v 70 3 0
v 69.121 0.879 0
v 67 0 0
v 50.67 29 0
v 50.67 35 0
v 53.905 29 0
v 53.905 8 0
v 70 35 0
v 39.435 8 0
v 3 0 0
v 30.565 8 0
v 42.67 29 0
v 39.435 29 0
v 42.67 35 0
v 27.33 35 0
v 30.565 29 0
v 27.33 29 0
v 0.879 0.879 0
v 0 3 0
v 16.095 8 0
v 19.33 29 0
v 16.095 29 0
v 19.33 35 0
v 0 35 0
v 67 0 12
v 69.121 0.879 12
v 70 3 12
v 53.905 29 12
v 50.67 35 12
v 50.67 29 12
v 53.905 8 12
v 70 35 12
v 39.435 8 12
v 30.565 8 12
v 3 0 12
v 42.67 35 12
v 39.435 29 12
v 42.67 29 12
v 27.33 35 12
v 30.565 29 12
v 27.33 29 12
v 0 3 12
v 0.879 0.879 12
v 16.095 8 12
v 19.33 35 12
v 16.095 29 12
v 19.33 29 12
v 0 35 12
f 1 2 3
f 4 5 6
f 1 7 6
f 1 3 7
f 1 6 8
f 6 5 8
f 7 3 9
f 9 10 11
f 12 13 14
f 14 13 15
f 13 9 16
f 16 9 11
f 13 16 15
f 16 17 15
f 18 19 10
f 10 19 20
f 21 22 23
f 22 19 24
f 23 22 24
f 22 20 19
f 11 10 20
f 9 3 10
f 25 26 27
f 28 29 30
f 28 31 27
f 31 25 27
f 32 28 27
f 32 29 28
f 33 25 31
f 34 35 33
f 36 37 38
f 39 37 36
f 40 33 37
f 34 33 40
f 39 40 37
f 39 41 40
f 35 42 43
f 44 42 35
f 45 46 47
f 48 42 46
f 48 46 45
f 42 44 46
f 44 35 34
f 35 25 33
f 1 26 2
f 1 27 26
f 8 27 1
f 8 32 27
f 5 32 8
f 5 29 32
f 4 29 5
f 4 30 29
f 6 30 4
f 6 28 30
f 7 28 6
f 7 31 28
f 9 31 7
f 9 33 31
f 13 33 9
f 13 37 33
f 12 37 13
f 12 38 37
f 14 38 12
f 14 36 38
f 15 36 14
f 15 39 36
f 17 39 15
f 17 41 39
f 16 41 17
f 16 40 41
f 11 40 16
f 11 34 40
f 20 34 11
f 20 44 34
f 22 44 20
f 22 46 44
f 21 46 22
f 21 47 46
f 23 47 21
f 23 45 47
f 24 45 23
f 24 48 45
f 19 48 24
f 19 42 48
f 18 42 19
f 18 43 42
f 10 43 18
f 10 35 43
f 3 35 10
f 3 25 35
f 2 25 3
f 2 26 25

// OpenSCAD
$fn = 32;

// ----------------------------------------------------------------------
// Window plate: 70 x 35 mm, 2 open windows
// ----------------------------------------------------------------------

// --- parameters (mm) ---
profile_height = 12;      // extrusion height
profile_points = 24;      // points of the closed outline

profile = [[0, 3], [0.879, 0.879], [3, 0], [67, 0], [69.121, 0.879], [70, 3], [70, 35], [50.67, 35], [50.67, 29], [53.905, 29], [53.905, 8], [39.435, 8], [39.435, 29], [42.67, 29], [42.67, 35], [27.33, 35], [27.33, 29], [30.565, 29], [30.565, 8], [16.095, 8], [16.095, 29], [19.33, 29], [19.33, 35], [0, 35]];  // single closed polygon, 24 points, counter clockwise

// --- the one profile operation ---
linear_extrude(height = profile_height) polygon(points = profile);
